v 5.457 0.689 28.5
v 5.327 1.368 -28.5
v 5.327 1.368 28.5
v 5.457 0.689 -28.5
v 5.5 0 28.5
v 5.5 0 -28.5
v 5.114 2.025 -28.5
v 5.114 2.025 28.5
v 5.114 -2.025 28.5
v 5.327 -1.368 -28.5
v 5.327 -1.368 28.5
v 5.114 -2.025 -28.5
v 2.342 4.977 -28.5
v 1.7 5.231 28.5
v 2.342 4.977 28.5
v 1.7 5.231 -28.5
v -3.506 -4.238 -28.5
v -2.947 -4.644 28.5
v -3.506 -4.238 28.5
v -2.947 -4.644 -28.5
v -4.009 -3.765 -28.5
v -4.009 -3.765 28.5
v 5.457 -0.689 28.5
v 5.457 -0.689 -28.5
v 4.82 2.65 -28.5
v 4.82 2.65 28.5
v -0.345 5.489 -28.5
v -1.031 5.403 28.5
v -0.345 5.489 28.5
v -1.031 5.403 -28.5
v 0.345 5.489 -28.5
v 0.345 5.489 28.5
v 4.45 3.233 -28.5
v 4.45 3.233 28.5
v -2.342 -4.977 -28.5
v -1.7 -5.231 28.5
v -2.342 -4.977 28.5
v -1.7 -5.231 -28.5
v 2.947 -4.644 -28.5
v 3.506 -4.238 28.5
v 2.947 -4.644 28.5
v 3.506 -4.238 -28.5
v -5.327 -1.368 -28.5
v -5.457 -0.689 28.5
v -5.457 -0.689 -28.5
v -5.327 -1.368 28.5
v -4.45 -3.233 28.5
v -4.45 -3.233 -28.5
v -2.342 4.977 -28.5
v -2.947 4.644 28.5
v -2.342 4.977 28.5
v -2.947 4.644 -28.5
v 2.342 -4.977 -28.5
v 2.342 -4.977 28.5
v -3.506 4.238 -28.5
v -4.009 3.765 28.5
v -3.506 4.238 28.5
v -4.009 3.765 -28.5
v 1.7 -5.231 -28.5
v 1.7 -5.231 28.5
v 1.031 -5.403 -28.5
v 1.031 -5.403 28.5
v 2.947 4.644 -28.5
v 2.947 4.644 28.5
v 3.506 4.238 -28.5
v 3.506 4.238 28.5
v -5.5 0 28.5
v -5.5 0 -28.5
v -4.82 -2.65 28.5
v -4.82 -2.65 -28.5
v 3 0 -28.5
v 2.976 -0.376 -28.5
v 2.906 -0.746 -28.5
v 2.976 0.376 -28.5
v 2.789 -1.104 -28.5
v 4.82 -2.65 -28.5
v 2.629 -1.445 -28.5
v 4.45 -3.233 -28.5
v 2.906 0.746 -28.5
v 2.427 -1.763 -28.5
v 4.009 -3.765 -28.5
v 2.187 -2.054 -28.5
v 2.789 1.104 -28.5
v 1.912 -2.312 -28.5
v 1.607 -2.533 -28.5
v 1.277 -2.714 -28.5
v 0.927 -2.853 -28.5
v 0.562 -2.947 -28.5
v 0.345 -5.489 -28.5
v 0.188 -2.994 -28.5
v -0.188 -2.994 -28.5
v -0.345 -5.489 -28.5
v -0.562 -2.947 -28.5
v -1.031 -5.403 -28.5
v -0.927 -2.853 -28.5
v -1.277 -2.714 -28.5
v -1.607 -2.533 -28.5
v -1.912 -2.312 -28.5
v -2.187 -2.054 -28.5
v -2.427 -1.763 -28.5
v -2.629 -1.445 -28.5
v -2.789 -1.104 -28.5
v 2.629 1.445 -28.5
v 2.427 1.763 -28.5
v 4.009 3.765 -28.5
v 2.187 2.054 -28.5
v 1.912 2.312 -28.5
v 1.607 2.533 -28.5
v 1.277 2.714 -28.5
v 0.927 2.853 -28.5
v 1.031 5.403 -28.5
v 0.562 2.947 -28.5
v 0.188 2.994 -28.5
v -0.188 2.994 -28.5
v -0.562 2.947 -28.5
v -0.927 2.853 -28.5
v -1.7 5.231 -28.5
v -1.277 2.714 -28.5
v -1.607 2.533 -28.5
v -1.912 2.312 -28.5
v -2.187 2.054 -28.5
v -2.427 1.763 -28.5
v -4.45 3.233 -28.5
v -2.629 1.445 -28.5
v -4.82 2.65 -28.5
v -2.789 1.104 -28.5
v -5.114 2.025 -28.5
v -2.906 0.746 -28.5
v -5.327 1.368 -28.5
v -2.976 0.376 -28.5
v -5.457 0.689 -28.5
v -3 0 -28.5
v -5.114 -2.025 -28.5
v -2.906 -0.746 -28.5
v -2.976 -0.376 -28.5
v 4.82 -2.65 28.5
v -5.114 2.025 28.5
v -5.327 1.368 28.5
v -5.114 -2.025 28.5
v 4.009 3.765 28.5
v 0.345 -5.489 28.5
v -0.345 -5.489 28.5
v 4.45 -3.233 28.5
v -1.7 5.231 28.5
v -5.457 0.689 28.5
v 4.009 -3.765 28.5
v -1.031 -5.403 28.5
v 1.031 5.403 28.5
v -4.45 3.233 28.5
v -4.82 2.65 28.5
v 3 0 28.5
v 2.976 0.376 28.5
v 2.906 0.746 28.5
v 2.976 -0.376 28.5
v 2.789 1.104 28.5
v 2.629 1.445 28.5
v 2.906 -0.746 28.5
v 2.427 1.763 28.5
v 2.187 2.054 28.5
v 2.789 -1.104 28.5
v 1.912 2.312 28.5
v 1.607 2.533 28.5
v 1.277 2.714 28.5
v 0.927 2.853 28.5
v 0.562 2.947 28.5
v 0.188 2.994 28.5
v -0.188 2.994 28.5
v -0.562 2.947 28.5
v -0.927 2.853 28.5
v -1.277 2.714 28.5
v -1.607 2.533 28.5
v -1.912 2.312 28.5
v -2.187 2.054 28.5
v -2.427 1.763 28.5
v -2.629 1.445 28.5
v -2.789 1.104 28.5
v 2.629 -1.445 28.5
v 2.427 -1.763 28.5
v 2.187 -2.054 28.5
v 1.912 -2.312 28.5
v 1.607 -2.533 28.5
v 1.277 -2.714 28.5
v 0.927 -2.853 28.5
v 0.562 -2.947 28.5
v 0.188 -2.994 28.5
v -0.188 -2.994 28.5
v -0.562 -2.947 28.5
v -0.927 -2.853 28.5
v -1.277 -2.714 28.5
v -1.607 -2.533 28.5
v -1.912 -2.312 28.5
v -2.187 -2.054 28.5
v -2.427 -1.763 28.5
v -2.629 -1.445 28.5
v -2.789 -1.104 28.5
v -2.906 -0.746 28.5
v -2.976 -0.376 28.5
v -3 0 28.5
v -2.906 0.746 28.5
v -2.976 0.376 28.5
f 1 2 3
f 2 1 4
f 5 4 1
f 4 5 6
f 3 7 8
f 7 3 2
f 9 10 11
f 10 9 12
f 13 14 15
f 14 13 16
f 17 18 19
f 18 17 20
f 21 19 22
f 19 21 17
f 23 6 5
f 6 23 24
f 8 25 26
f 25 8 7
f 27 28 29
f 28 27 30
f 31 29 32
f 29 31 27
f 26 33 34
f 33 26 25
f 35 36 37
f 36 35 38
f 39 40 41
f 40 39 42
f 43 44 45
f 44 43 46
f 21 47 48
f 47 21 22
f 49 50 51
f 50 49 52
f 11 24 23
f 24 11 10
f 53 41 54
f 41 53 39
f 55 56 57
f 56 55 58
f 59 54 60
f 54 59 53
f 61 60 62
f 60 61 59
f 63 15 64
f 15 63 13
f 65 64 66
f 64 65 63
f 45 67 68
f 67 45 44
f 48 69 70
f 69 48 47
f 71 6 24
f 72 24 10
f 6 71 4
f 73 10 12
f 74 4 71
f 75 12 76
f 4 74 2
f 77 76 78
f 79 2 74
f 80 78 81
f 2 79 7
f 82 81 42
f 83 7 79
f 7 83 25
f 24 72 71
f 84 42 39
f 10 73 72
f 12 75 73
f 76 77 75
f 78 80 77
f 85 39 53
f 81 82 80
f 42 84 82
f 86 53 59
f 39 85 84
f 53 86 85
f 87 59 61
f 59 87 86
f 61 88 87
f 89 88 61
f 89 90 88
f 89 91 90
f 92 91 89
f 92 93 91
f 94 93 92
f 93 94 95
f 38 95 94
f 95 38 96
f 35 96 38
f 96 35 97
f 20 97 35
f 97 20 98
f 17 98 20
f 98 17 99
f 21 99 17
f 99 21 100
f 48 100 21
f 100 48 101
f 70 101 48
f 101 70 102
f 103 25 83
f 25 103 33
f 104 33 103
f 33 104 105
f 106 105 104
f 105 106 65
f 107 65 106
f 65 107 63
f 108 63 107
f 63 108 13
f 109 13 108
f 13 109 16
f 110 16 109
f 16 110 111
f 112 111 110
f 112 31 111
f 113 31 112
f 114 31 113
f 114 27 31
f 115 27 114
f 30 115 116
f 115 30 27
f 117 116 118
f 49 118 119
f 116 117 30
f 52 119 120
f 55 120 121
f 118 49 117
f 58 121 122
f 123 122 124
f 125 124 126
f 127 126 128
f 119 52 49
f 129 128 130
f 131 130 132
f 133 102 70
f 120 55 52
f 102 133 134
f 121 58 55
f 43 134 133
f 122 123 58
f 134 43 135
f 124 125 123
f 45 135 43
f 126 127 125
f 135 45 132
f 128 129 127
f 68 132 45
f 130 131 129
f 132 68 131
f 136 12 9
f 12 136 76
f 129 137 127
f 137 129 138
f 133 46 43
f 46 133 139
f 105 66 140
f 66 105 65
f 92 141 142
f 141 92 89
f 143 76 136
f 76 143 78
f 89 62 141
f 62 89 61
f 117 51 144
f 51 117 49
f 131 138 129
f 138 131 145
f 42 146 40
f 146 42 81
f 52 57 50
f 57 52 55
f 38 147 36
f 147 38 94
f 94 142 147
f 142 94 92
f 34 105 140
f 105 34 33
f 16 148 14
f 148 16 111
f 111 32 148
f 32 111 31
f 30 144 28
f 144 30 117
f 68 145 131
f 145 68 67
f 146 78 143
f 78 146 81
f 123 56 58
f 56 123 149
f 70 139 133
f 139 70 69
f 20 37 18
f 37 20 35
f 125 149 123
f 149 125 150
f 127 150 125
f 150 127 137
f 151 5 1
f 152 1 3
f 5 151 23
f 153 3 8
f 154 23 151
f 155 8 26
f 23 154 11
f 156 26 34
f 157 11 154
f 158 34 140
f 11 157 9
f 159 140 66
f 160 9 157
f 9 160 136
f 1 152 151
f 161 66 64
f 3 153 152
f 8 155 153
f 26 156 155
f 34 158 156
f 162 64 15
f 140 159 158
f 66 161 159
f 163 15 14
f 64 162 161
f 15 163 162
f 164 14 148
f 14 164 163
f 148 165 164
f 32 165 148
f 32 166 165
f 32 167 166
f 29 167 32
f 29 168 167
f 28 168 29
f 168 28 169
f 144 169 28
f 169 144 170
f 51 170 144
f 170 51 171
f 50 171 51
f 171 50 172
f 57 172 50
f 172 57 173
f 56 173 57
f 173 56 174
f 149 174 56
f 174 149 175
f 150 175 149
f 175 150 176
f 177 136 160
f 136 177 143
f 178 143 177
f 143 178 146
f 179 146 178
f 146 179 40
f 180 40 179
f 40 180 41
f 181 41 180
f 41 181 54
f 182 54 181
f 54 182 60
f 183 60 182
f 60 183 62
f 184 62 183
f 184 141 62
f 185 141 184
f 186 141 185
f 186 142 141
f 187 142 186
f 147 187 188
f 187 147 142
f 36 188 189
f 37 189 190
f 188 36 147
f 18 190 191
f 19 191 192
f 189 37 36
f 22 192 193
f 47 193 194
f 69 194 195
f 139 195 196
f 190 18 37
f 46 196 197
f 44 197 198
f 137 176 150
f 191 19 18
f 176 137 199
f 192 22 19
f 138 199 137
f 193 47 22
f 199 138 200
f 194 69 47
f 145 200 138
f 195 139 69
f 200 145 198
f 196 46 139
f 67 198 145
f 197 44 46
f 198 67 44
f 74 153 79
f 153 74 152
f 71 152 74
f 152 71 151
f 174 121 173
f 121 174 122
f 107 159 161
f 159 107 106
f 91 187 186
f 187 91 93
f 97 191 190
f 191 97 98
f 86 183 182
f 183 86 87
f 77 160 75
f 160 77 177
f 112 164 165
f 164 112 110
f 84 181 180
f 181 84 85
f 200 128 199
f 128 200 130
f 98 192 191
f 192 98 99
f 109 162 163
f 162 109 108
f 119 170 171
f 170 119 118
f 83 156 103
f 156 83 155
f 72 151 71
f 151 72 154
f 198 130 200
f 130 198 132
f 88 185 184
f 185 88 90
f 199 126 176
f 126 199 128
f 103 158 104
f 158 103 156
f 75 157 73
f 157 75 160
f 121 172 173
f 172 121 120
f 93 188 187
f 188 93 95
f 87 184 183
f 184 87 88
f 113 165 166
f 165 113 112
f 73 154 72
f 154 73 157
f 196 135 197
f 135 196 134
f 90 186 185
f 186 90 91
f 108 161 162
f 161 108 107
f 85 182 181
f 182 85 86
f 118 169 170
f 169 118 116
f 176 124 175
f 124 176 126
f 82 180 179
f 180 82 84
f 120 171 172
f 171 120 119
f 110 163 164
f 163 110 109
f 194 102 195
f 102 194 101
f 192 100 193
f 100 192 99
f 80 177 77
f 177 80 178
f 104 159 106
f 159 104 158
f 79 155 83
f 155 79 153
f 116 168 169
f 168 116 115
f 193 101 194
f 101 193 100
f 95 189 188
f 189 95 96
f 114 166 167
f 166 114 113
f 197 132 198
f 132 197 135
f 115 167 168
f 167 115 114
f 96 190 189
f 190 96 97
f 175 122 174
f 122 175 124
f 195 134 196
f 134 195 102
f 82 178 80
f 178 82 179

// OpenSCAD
$fn = 50;


difference() {
	union() {
		translate(v = [0, 0, -28.5000000000]) {
			cylinder(h = 57, r = 5.5000000000);
		}
	}
	union() {
		translate(v = [0, 0, -100.0000000000]) {
			cylinder(h = 200, r = 3.0000000000);
		}
	}
}
